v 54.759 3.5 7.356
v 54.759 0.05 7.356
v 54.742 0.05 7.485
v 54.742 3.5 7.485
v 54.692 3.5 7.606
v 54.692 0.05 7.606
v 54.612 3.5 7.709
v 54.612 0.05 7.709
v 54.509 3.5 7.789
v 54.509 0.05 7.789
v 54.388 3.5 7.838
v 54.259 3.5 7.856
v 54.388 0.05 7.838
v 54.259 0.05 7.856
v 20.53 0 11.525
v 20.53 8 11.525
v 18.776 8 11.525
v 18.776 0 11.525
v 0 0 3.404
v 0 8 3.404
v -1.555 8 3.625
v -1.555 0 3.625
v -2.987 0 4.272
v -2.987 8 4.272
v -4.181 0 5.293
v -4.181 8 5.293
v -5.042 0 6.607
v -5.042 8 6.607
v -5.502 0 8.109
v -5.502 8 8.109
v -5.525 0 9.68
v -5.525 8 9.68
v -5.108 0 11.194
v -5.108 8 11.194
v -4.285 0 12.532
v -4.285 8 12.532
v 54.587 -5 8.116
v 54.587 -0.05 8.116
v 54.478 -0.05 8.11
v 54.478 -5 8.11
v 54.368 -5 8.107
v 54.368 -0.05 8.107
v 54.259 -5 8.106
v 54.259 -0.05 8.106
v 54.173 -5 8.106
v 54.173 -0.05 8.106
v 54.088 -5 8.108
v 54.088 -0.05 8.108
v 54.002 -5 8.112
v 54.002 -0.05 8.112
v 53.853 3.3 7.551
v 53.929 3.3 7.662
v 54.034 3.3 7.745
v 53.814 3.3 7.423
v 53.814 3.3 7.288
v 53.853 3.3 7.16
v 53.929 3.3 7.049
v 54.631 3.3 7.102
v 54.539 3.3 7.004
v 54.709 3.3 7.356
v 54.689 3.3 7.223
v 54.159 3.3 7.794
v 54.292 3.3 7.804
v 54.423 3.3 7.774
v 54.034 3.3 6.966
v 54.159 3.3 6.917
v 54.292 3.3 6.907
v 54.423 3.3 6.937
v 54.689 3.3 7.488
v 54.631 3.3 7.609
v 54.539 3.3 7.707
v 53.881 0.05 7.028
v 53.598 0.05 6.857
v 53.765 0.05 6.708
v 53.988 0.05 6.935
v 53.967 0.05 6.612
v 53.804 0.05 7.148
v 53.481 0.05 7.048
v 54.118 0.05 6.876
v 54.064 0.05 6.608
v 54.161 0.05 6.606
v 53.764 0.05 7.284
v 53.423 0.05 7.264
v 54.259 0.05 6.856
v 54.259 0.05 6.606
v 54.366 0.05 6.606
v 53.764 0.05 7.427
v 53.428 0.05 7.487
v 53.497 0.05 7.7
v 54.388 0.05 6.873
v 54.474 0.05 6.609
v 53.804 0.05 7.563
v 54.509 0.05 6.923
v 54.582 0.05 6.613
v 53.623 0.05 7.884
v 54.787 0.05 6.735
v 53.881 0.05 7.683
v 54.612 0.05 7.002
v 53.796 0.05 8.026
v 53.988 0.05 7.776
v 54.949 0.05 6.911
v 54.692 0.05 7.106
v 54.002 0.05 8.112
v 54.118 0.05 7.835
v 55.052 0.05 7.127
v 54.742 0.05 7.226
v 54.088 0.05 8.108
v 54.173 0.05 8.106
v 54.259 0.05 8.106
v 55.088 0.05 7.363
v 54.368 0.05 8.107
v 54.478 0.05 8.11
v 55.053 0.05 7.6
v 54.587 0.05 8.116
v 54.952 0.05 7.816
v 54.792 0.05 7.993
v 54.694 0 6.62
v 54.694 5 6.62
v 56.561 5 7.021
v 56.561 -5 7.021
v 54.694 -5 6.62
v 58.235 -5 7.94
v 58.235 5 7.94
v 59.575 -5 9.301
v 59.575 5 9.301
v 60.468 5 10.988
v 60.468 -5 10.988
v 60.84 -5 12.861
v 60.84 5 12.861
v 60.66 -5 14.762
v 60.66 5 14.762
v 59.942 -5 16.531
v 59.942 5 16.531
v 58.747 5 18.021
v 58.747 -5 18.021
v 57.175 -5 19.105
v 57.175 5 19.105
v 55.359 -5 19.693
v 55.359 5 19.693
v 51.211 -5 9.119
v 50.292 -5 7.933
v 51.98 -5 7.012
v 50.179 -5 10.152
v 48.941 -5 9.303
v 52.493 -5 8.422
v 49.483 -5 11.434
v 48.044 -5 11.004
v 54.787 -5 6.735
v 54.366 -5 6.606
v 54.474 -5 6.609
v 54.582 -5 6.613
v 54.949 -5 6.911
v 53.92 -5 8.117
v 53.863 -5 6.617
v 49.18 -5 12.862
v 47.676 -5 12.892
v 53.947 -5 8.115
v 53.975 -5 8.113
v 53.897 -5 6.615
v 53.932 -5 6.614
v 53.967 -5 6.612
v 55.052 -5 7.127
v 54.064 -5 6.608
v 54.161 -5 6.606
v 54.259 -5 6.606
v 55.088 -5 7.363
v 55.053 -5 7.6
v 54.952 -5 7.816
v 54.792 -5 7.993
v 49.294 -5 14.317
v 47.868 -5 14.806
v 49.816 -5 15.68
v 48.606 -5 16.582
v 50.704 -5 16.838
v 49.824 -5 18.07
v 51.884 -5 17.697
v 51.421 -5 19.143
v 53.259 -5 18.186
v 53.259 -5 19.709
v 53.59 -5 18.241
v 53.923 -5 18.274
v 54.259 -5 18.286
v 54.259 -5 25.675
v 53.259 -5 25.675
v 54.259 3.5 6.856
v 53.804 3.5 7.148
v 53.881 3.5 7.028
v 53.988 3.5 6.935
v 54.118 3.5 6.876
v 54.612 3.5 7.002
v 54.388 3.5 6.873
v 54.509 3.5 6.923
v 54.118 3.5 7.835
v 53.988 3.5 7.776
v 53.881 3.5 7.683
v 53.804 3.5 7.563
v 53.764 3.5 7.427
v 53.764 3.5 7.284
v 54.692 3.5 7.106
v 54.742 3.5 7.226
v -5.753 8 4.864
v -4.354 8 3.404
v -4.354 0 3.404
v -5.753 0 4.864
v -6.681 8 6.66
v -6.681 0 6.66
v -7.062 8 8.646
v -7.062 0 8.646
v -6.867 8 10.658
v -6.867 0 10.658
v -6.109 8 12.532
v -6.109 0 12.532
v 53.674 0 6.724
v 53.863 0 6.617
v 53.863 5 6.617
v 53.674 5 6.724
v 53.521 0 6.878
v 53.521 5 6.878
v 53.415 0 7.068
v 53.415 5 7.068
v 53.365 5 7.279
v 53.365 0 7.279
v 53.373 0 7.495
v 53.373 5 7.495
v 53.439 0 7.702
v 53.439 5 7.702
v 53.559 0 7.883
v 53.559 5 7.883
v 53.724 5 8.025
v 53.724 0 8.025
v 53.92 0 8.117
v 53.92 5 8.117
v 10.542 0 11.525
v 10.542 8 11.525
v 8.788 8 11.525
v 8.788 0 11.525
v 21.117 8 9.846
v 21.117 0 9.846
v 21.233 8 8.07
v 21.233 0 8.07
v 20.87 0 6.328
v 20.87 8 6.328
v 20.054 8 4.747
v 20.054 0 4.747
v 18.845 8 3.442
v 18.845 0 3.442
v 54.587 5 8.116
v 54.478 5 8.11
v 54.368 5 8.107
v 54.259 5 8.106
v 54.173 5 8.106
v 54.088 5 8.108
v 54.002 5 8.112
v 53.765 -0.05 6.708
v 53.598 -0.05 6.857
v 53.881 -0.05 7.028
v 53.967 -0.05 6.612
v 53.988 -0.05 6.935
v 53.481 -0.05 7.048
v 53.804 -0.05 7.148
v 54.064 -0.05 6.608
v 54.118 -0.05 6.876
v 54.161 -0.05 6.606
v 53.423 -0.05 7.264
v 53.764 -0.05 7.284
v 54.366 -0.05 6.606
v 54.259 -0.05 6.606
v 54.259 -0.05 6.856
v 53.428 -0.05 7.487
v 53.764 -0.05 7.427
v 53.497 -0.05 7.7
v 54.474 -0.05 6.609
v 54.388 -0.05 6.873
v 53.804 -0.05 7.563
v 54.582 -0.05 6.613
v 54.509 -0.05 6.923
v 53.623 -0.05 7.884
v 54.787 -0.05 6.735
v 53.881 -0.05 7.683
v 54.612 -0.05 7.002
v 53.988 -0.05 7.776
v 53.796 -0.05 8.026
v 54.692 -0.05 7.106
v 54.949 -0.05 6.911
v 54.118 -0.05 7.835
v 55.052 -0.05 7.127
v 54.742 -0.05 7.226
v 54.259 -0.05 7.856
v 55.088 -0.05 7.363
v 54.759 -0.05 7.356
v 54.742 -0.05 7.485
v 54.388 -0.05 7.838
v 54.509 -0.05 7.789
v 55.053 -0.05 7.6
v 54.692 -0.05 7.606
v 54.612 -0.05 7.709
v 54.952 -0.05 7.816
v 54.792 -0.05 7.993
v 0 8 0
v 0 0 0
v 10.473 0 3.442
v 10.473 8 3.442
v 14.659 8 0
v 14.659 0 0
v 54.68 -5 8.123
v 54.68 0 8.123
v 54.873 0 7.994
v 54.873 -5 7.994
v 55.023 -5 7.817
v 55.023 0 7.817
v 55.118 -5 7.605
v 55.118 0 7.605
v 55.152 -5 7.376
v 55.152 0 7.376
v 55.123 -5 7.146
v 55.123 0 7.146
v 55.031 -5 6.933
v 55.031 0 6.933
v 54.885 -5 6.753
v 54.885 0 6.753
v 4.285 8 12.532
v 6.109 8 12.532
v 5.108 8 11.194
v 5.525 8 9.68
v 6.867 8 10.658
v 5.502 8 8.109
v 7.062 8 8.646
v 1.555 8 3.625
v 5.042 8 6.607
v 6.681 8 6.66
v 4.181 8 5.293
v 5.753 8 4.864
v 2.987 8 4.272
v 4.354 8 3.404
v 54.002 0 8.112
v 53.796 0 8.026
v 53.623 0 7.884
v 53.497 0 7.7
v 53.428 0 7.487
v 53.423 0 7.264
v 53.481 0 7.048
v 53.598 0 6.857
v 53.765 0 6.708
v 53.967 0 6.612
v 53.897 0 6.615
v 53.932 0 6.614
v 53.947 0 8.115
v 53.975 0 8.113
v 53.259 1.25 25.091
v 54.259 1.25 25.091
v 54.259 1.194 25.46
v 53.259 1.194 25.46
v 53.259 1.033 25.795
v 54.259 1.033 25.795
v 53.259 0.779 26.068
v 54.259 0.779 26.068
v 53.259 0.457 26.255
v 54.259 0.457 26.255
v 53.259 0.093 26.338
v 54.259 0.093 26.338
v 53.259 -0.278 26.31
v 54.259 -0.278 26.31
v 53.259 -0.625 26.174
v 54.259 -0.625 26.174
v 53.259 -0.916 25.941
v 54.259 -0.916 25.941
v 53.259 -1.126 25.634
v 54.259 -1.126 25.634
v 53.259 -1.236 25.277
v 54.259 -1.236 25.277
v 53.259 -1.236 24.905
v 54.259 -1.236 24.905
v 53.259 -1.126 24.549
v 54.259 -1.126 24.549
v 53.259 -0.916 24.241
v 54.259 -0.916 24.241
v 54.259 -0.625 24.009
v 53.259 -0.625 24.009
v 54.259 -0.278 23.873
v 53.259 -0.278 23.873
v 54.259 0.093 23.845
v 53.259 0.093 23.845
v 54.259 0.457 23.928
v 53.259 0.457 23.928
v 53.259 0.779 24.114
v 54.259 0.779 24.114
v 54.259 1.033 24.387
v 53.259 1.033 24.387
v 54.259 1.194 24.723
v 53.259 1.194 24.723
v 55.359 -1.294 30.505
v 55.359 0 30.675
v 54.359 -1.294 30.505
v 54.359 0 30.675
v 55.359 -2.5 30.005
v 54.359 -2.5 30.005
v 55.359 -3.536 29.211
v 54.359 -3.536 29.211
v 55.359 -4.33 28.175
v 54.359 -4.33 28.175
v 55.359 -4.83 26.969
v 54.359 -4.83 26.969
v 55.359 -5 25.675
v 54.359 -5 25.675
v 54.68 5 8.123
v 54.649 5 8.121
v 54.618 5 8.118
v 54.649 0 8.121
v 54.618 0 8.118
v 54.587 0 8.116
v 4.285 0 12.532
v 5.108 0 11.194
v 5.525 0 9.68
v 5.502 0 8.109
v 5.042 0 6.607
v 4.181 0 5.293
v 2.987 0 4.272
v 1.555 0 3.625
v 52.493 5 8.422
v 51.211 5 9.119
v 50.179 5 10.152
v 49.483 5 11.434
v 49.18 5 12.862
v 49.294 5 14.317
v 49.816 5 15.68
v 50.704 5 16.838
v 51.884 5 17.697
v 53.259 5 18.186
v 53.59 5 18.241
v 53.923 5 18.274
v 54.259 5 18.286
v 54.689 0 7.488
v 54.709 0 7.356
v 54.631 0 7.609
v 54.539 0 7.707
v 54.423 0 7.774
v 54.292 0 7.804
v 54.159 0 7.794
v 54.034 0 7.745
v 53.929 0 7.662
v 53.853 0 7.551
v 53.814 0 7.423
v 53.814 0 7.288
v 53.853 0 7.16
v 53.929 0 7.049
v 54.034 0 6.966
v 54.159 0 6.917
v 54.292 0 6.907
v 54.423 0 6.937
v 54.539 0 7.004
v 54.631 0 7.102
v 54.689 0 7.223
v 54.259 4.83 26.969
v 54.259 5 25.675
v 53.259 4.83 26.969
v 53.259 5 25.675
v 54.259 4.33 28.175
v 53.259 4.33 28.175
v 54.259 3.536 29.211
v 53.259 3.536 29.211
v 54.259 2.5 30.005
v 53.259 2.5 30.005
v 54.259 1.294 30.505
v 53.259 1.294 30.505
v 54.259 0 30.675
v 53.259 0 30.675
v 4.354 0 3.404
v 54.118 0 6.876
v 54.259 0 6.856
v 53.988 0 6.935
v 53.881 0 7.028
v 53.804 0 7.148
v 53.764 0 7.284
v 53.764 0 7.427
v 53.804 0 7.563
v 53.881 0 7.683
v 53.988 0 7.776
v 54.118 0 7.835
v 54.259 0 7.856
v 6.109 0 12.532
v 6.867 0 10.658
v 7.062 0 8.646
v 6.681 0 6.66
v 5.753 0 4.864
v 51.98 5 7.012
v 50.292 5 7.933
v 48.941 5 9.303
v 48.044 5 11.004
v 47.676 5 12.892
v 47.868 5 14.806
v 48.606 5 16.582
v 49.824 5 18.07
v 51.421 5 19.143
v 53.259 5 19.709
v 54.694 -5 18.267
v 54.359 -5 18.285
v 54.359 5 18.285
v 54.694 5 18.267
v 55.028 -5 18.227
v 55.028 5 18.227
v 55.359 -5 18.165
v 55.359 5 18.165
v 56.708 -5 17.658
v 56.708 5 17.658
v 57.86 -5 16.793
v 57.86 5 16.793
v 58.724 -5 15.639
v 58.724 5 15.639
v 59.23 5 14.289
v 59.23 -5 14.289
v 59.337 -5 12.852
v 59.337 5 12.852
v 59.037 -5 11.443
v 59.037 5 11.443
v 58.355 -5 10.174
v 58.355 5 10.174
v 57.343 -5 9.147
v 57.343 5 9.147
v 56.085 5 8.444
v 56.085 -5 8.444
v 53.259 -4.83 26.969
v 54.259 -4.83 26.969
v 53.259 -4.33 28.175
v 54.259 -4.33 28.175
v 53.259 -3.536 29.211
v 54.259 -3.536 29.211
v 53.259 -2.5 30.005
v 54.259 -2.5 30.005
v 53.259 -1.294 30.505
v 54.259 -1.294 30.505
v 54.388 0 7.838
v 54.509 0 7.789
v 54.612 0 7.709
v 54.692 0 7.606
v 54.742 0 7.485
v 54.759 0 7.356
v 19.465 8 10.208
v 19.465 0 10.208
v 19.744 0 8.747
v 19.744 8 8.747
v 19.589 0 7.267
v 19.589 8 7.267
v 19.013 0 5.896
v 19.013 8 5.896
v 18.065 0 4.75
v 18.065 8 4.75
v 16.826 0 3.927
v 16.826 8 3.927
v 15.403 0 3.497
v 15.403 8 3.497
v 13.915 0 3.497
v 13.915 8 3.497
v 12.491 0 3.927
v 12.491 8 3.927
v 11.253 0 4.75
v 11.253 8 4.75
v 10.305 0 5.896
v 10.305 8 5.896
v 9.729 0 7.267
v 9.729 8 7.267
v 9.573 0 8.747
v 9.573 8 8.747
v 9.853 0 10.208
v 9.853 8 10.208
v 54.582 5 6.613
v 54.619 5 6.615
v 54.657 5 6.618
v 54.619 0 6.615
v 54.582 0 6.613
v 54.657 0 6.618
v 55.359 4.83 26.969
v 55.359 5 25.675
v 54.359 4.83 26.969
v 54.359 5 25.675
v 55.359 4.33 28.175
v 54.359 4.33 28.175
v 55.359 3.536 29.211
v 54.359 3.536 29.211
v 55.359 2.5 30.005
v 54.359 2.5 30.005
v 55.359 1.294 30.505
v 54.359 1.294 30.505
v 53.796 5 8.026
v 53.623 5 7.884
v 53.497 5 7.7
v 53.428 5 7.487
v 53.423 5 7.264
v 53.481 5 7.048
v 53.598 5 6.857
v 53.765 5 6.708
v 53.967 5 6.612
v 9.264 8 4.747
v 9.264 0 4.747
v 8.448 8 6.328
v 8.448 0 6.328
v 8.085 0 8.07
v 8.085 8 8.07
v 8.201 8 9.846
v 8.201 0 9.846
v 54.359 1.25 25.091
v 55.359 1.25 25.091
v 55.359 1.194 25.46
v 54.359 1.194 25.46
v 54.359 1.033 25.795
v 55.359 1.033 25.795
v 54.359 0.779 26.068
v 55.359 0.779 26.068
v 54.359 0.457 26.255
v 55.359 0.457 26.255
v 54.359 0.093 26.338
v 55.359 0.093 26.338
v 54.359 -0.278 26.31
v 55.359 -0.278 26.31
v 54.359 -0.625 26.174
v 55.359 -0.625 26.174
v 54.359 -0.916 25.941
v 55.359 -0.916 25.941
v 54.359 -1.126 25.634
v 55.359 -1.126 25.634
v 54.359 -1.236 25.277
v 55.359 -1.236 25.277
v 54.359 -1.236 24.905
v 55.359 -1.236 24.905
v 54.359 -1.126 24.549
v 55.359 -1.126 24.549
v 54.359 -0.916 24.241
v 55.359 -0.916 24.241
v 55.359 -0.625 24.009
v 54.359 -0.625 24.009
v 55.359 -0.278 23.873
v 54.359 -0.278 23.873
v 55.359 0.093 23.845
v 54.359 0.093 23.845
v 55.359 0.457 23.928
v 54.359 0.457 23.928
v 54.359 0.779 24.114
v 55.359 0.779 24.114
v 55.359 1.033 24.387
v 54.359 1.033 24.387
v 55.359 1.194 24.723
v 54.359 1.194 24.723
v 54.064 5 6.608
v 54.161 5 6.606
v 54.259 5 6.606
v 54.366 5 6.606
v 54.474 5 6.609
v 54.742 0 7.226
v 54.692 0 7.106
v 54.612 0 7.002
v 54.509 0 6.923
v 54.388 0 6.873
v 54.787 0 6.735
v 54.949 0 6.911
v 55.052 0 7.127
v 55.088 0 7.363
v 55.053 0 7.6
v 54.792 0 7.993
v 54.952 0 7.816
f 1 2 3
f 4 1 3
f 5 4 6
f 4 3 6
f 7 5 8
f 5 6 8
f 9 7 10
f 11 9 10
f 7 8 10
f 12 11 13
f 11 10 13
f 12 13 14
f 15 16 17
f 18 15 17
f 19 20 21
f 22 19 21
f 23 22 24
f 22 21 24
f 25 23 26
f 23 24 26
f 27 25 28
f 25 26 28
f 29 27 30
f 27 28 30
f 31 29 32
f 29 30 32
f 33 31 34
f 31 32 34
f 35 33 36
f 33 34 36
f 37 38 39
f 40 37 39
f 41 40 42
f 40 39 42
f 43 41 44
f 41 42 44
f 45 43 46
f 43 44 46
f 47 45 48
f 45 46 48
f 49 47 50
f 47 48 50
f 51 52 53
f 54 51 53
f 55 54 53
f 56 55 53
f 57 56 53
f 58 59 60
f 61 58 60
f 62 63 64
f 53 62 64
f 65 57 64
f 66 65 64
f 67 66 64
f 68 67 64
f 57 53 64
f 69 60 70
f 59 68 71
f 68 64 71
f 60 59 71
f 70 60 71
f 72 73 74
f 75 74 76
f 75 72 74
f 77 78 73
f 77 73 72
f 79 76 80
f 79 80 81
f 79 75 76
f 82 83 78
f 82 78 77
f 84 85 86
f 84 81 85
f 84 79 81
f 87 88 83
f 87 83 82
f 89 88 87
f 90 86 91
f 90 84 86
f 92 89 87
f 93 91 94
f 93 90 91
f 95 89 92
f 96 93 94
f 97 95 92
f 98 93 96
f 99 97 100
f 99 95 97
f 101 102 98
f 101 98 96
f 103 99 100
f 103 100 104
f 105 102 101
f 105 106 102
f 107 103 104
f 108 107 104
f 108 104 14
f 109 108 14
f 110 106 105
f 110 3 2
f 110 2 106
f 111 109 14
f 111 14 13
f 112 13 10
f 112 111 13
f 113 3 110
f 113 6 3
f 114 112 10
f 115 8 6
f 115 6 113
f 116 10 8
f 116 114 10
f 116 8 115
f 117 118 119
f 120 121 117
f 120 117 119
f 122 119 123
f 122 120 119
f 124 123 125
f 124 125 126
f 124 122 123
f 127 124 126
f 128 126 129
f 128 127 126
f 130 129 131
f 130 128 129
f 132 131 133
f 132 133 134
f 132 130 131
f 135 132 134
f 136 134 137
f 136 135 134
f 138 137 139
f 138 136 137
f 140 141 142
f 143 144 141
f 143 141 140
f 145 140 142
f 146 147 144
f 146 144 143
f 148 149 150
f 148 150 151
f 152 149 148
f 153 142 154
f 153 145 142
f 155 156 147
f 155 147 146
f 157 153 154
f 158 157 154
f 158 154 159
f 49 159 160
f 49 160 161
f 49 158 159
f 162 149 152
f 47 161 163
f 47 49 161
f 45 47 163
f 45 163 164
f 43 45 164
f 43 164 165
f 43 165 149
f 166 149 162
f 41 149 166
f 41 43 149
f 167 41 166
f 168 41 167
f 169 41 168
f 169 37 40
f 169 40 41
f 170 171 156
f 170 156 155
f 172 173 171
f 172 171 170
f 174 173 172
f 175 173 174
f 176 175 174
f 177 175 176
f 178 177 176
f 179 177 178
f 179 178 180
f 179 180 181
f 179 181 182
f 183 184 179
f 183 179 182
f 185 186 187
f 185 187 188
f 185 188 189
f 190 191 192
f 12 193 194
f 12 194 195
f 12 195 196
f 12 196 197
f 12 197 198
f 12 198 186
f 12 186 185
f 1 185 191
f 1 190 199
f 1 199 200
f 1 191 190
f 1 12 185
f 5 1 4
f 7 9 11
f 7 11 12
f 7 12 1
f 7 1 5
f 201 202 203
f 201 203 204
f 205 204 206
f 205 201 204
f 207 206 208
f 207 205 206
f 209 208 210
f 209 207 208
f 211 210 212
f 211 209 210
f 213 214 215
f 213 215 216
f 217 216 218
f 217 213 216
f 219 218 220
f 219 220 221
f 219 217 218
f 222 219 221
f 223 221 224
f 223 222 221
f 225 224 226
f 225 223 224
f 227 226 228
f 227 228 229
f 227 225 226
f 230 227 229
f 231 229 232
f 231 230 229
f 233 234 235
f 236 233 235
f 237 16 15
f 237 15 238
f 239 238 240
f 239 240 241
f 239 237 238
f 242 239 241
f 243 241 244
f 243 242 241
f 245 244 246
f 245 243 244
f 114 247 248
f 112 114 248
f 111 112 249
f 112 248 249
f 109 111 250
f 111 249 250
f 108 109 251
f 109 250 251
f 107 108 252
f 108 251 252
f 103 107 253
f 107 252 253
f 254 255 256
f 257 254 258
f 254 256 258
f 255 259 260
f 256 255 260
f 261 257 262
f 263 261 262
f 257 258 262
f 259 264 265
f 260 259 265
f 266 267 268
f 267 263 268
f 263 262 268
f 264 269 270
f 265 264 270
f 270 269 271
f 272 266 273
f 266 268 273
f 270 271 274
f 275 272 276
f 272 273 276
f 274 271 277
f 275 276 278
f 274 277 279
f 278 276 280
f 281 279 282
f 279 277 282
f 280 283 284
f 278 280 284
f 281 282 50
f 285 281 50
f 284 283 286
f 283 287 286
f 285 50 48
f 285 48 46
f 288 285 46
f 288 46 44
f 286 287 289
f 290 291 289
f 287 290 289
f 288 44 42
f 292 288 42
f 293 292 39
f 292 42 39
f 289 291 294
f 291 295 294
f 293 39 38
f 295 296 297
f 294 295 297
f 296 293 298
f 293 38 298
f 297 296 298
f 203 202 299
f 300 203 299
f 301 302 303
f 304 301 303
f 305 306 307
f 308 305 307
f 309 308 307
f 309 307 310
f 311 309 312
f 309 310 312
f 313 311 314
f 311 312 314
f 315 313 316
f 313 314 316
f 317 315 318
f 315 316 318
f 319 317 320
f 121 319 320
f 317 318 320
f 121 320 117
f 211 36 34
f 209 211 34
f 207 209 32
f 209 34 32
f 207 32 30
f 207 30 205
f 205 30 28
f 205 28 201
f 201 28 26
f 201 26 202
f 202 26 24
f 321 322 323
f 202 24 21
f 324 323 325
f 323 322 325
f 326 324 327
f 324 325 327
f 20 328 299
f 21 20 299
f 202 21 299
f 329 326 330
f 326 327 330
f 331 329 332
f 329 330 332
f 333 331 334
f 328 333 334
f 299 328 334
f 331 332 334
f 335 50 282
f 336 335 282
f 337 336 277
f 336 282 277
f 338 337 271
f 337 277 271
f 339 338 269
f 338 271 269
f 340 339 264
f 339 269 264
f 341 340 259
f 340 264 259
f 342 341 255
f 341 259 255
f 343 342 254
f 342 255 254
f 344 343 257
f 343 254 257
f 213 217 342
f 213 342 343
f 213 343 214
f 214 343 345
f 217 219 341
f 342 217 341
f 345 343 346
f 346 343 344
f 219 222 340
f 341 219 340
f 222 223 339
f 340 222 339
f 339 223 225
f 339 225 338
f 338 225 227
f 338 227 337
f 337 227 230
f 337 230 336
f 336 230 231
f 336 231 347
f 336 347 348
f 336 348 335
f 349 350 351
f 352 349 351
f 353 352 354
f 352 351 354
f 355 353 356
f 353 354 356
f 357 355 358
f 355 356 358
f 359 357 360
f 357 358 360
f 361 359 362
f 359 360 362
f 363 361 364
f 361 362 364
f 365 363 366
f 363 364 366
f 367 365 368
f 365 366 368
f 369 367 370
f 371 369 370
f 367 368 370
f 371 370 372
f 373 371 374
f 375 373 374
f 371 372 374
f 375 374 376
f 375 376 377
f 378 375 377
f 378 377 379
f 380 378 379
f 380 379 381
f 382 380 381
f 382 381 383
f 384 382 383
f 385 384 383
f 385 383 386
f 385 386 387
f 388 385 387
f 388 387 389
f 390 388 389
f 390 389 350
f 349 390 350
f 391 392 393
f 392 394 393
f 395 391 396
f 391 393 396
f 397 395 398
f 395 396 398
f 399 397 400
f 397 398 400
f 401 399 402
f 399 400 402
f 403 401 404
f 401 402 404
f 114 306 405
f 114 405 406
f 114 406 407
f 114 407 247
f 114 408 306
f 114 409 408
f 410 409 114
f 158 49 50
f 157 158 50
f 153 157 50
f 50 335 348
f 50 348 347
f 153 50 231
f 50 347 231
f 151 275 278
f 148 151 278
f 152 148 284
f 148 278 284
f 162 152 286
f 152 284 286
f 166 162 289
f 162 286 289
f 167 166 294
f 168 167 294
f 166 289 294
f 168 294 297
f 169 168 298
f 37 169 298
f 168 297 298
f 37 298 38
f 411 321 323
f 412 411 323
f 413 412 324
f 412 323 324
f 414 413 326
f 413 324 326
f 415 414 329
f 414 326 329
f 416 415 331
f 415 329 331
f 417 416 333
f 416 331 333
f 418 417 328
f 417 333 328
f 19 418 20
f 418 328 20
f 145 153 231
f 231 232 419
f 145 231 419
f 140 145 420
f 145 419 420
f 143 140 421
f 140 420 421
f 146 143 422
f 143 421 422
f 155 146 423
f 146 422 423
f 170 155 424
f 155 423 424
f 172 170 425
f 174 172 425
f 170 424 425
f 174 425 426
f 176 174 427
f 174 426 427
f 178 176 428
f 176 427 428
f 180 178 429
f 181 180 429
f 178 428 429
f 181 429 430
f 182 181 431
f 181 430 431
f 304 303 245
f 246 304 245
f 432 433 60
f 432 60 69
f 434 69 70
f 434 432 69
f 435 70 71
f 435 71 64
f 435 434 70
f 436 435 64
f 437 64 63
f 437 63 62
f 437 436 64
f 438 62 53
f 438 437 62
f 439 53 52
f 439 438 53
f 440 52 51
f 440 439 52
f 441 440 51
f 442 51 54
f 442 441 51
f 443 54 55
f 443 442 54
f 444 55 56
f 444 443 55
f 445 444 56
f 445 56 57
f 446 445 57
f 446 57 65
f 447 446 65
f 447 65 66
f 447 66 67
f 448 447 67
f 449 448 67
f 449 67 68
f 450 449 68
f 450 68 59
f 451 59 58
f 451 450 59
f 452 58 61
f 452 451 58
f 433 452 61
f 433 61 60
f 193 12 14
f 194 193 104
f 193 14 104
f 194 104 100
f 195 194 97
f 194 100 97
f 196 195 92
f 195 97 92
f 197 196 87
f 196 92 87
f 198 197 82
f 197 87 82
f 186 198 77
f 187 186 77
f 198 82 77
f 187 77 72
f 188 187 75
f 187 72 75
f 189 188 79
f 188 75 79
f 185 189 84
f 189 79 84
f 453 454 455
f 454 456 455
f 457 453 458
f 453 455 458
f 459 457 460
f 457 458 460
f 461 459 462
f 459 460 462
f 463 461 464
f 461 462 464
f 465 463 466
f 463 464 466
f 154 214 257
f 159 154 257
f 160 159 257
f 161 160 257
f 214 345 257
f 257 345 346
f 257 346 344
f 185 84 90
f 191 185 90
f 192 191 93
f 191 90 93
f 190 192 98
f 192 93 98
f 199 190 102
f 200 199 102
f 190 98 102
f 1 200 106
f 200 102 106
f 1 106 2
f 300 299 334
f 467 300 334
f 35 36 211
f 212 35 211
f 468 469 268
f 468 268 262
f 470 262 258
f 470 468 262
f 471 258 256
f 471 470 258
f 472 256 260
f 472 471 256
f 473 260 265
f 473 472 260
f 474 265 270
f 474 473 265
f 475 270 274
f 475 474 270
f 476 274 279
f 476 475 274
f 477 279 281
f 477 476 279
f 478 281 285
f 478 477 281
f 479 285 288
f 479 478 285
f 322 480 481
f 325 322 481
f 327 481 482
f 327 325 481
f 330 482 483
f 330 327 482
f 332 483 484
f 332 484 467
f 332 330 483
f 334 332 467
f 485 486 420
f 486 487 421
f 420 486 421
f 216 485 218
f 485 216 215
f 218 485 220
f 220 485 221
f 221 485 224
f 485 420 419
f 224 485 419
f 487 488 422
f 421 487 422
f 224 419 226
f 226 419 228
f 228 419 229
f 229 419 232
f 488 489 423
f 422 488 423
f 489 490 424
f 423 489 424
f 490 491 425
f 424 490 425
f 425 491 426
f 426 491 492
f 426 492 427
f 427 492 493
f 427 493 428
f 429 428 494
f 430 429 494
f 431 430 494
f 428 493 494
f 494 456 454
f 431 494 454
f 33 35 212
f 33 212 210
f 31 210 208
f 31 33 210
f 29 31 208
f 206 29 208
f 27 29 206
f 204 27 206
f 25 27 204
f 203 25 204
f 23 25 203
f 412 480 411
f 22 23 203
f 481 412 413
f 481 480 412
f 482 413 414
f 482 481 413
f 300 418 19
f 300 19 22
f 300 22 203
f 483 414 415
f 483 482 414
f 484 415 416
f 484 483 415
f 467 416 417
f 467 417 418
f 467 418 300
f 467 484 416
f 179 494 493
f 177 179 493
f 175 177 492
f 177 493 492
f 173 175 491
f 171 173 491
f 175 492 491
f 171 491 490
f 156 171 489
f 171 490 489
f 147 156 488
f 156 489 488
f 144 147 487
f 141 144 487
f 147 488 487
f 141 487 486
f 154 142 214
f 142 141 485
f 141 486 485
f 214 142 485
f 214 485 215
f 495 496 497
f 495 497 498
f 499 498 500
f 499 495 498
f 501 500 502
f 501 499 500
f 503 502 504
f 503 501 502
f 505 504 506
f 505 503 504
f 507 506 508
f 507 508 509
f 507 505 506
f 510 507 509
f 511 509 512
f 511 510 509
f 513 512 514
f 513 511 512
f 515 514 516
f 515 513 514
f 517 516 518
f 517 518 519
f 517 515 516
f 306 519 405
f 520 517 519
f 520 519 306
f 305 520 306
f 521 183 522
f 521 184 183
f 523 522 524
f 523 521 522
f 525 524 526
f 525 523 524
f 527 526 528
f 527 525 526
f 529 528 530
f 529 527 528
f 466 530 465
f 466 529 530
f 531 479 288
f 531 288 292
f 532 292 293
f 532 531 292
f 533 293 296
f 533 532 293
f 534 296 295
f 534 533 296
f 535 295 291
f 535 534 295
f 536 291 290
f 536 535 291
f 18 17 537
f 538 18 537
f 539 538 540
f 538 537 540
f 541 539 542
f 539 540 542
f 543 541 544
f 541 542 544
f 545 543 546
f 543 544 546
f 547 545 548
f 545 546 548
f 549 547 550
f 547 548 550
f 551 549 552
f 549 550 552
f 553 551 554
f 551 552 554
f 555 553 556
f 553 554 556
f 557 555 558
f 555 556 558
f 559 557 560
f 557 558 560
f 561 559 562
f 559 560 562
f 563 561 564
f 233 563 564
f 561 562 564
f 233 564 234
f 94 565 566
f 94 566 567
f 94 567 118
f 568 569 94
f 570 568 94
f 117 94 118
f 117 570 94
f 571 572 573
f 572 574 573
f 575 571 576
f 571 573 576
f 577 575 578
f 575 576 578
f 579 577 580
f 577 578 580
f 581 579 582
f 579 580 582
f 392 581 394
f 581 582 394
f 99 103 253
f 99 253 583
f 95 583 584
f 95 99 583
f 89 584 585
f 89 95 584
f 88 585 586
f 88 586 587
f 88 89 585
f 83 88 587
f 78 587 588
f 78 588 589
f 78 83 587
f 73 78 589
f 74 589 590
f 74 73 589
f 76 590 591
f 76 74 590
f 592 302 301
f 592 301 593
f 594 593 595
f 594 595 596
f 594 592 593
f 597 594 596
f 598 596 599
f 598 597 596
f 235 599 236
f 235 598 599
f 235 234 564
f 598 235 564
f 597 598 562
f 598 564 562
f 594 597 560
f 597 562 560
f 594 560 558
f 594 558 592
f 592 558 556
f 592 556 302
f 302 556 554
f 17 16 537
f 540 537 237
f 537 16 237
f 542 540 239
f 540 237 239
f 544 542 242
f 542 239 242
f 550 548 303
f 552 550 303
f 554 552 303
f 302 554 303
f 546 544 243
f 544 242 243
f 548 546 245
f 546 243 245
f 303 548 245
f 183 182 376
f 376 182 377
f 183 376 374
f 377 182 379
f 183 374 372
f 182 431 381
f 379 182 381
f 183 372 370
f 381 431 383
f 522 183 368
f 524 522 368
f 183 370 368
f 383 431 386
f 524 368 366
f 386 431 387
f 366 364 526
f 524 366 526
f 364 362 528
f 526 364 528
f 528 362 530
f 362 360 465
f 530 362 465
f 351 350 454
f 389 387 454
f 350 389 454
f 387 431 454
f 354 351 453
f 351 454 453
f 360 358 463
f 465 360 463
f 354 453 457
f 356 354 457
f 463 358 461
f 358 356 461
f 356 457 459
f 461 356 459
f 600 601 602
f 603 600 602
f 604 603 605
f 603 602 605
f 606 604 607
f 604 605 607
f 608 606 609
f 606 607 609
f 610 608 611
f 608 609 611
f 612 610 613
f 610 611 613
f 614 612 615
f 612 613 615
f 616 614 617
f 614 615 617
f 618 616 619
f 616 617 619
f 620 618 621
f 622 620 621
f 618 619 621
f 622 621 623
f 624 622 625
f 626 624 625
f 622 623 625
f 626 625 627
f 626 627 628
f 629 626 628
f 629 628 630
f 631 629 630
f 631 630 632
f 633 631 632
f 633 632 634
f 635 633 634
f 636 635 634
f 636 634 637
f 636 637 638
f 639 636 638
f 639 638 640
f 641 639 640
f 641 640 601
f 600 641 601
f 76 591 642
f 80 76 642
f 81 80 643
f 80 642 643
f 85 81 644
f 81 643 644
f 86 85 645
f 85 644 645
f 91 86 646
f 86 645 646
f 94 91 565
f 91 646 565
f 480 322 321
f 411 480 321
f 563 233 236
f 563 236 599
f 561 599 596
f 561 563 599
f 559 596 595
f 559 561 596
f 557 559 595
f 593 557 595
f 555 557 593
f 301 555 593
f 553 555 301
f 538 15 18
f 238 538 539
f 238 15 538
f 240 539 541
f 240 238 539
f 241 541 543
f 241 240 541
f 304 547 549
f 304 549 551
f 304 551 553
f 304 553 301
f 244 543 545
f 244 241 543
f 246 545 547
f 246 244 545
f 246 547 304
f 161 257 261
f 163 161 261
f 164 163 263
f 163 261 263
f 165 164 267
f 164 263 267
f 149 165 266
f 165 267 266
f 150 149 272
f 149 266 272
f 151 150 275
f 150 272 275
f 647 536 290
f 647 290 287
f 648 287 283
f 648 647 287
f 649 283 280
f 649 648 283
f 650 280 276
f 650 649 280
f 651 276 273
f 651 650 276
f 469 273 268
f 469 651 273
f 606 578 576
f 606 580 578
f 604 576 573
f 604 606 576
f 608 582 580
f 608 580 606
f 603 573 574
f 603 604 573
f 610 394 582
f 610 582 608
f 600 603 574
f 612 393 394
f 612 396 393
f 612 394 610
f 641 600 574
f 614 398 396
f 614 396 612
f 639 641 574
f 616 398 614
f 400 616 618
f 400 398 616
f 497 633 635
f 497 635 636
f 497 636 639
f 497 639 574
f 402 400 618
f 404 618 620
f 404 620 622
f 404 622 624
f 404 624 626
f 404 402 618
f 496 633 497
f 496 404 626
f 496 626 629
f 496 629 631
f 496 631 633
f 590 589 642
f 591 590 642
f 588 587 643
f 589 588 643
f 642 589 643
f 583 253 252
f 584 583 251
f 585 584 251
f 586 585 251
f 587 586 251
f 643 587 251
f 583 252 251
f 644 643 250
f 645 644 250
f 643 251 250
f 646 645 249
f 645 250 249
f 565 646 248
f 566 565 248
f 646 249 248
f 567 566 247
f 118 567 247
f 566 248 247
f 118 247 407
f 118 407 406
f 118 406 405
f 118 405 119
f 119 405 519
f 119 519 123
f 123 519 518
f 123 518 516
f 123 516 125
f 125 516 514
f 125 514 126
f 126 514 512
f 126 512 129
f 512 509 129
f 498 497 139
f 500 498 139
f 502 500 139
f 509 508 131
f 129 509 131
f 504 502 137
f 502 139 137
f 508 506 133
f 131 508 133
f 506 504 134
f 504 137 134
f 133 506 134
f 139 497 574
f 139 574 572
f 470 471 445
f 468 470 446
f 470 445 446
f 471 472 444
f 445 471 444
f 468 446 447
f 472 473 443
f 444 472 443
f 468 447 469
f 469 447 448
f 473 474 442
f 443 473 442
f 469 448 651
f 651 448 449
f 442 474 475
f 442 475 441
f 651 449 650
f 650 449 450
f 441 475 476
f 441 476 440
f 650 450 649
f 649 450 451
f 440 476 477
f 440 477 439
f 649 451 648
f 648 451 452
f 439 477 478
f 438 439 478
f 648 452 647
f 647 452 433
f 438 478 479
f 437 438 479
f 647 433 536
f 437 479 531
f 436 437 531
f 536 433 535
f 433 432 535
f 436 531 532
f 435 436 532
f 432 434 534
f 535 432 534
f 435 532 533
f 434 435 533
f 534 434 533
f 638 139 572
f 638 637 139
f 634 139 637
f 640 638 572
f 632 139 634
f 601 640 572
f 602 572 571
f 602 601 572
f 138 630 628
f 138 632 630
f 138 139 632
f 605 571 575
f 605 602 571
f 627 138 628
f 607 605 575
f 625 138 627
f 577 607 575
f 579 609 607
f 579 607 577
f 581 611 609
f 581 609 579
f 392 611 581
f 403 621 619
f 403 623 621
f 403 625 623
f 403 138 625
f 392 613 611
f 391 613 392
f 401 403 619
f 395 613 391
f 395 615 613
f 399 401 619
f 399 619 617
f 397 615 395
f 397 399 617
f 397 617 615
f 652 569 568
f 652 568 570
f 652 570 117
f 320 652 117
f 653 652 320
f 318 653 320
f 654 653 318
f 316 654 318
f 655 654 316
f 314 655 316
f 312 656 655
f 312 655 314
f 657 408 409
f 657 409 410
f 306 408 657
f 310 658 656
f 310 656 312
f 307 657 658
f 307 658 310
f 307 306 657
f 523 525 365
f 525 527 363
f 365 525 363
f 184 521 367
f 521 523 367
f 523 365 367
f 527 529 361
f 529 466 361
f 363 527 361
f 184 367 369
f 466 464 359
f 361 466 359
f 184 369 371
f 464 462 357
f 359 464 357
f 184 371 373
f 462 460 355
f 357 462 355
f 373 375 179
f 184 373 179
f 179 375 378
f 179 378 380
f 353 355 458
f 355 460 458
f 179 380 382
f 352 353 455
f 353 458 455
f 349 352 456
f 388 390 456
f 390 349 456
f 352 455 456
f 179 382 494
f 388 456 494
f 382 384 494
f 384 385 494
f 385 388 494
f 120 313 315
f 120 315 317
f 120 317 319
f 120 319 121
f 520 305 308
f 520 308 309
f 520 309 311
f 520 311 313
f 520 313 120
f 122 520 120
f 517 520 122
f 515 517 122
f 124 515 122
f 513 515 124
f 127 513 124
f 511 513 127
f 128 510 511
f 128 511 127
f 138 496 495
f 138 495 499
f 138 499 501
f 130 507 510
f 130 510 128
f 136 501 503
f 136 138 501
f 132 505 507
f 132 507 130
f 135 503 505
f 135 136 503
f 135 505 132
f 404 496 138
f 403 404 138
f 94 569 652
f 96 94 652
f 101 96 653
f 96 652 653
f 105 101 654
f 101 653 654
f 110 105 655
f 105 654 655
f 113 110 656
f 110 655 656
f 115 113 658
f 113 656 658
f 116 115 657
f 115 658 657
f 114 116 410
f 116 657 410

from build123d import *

# Parameters (mm, degrees)
F5_DEPTH  = 5
F0_R      = 0.45
F6_DEPTH  = 3.5
F7_DEPTH  = 5
F8_DEPTH  = 3.3
F9_DEPTH  = 5.001
F10_DEPTH = 8.001
F11_DEPTH = 0.05
F12_R     = 1.25
F13_DEPTH = 62.4297639076
F14_R     = 4.99999


# Not quite as in the source:
# - a fillet or chamfer is up to 0.001 mm smaller than in the source, because OpenCascade refuses the exact size
# - a feature names something its author has since deleted; it is built from what else it names


with BuildPart() as f3:
    # F3: sweep along a path in F2
    with BuildLine(Plane.XY) as f3_path:
        Line((0, 0), (0, 8))
    # F0 (on Front) → F3 (sweep)
    with BuildSketch(Plane.XZ):
        with BuildLine():
            Line((-4.2852259595, 12.5322833964), (-6.1092684933, 12.5322833964))
            ThreePointArc((-6.1092684933, 12.5322833964), (-6.9428544736, 7.6391569536), (-4.3543082114, 3.4039497307))
            Line((-4.3543082114, 3.4039497307), (0, 3.4039497307))
            ThreePointArc((0, 3.4039497307), (-5.042063988, 6.6069916109), (-4.2852259595, 12.5322833964))
        make_face()
        with BuildLine():
            Line((0, 3.4039497307), (-4.3543082114, 3.4039497307))
            ThreePointArc((-4.3543082114, 3.4039497307), (-2.3027157879, 2.2894602214), (0, 1.9039497307))
            Line((0, 1.9039497307), (0, 3.4039497307))
        make_face()
        with BuildLine():
            ThreePointArc((0, 1.9039497307), (-2.3027157879, 2.2894602214), (-4.3543082114, 3.4039497307))
            Line((-4.3543082114, 3.4039497307), (0, 0))
            Line((0, 0), (0, 1.9039497307))
        make_face()
        with BuildLine():
            ThreePointArc((4.3543082114, 3.4039497307), (2.3027157879, 2.2894602214), (0, 1.9039497307))
            Line((0, 1.9039497307), (0, 0))
            Line((0, 0), (4.3543082114, 3.4039497307))
        make_face()
        with BuildLine():
            Line((0, 3.4039497307), (0, 1.9039497307))
            ThreePointArc((0, 1.9039497307), (2.3027157879, 2.2894602214), (4.3543082114, 3.4039497307))
            Line((4.3543082114, 3.4039497307), (0, 3.4039497307))
        make_face()
        with BuildLine():
            ThreePointArc((4.2852259595, 12.5322833964), (5.042063988, 6.6069916109), (0, 3.4039497307))
            Line((0, 3.4039497307), (4.3543082114, 3.4039497307))
            ThreePointArc((4.3543082114, 3.4039497307), (6.9428544736, 7.6391569536), (6.1092684933, 12.5322833964))
            Line((6.1092684933, 12.5322833964), (4.2852259595, 12.5322833964))
        make_face()
    sweep(path=f3_path.line)

    # F0 (on Front) → F9 (cut, through all)
    with BuildSketch(Plane.XZ):
        with BuildLine():
            ThreePointArc((54.5868154242, 8.1161158316), (55.0876267464, 7.3630999101), (54.581783754, 6.6134547771))
            ThreePointArc((54.581783754, 6.6134547771), (54.6381547588, 6.6164632985), (54.6944979239, 6.6199545901))
            ThreePointArc((54.6944979239, 6.6199545901), (55.1524674782, 7.3759380646), (54.6800855939, 8.1230006335))
            ThreePointArc((54.6800855939, 8.1230006335), (54.6334663221, 8.1193440091), (54.5868154242, 8.1161158316))
        make_face()
    extrude(amount=F9_DEPTH, mode=Mode.SUBTRACT)

    # F0 (on Front) → F10 (cut, through all)
    with BuildSketch(Plane.XZ):
        with BuildLine():
            ThreePointArc((53.9199314878, 8.116823601), (53.3614179699, 7.3872965022), (53.862876759, 6.6174353327))
            ThreePointArc((53.862876759, 6.6174353327), (53.9147482987, 6.6145187306), (53.9666412198, 6.6120111547))
            ThreePointArc((53.9666412198, 6.6120111547), (53.4175421646, 7.3754821716), (54.0022997363, 8.1119985313))
            ThreePointArc((54.0022997363, 8.1119985313), (53.961105835, 8.1142441636), (53.9199314878, 8.116823601))
        make_face()
    extrude(amount=-F10_DEPTH, mode=Mode.SUBTRACT)


with BuildPart() as f4:
    # F4: sweep along a path in F2
    with BuildLine(Plane.XY) as f4_path:
        Line((14.6589075401, 0), (14.6589075401, 8))
    # F0 (on Front) → F4 (sweep)
    with BuildSketch(Plane.XZ):
        with BuildLine():
            Line((10.542163481, 11.5254557146), (8.7879977598, 11.5254557146))
            ThreePointArc((8.7879977598, 11.5254557146), (8.2076139721, 7.1870854906), (10.4732176329, 3.442043222))
            Line((10.4732176329, 3.442043222), (14.6589075401, 3.442043222))
            ThreePointArc((14.6589075401, 3.442043222), (10.1232394754, 6.2221048665), (10.542163481, 11.5254557146))
        make_face()
        with BuildLine():
            Line((14.6589075401, 3.442043222), (10.4732176329, 3.442043222))
            ThreePointArc((10.4732176329, 3.442043222), (12.4357341326, 2.3283668926), (14.6589075401, 1.942043222))
            Line((14.6589075401, 1.942043222), (14.6589075401, 3.442043222))
        make_face()
        with BuildLine():
            ThreePointArc((14.6589075401, 1.942043222), (12.4357341326, 2.3283668926), (10.4732176329, 3.442043222))
            Line((10.4732176329, 3.442043222), (14.6589075401, 0))
            Line((14.6589075401, 0), (14.6589075401, 1.942043222))
        make_face()
        with BuildLine():
            ThreePointArc((18.8445974474, 3.442043222), (16.8820809477, 2.3283668926), (14.6589075401, 1.942043222))
            Line((14.6589075401, 1.942043222), (14.6589075401, 0))
            Line((14.6589075401, 0), (18.8445974474, 3.442043222))
        make_face()
        with BuildLine():
            Line((14.6589075401, 3.442043222), (14.6589075401, 1.942043222))
            ThreePointArc((14.6589075401, 1.942043222), (16.8820809477, 2.3283668926), (18.8445974474, 3.442043222))
            Line((18.8445974474, 3.442043222), (14.6589075401, 3.442043222))
        make_face()
        with BuildLine():
            ThreePointArc((18.7756515993, 11.5254557146), (19.1945756049, 6.2221048665), (14.6589075401, 3.442043222))
            Line((14.6589075401, 3.442043222), (18.8445974474, 3.442043222))
            ThreePointArc((18.8445974474, 3.442043222), (21.1102011082, 7.1870854906), (20.5298173205, 11.5254557146))
            Line((20.5298173205, 11.5254557146), (18.7756515993, 11.5254557146))
        make_face()
    sweep(path=f4_path.line)


with BuildPart() as f5:
    # F0 (on Front) → F5 (new body)
    with BuildSketch(Plane.XZ):
        with BuildLine():
            Line((53.2587639076, 18.1863348766), (53.2587639076, 19.7092189305))
            ThreePointArc((53.2587639076, 19.7092189305), (47.6757687932, 12.8917648009), (53.862876759, 6.6174353327))
            ThreePointArc((53.862876759, 6.6174353327), (53.3614179699, 7.3872965022), (53.9199314878, 8.116823601))
            ThreePointArc((53.9199314878, 8.116823601), (49.1797007662, 12.8620403018), (53.2587639076, 18.1863348766))
        make_face()
        with BuildLine():
            Line((53.2587639076, 30.67503149), (53.2587639076, 19.7092189305))
            Line((53.2587639076, 19.7092189305), (53.2587639076, 18.1863348766))
            ThreePointArc((53.2587639076, 18.1863348766), (53.7563098464, 18.2606730117), (54.2587639076, 18.2855333378))
            Line((54.2587639076, 18.2855333378), (54.2587639076, 30.67503149))
            Line((54.2587639076, 30.67503149), (53.2587639076, 30.67503149))
        make_face()
    extrude(amount=-F5_DEPTH)



with BuildPart() as f5b:
    # F0 (on Front) → F5, piece 2 (new body)
    with BuildSketch(Plane.XZ):
        with BuildLine():
            ThreePointArc((54.0022997363, 8.1119985313), (53.4175421646, 7.3754821716), (53.9666412198, 6.6120111547))
            ThreePointArc((53.9666412198, 6.6120111547), (54.1126666567, 6.6071529911), (54.2587639076, 6.6055333378))
            Line((54.2587639076, 6.6055333378), (54.2587639076, 6.8555333378))
            ThreePointArc((54.2587639076, 6.8555333378), (53.7587639076, 7.3555333378), (54.2587639076, 7.8555333378))
            Line((54.2587639076, 7.8555333378), (54.2587639076, 8.1055333378))
            ThreePointArc((54.2587639076, 8.1055333378), (54.1304910833, 8.1071498929), (54.0022997363, 8.1119985313))
        make_face()
        with BuildLine():
            Line((54.2587639076, 6.8555333378), (54.2587639076, 6.6055333378))
            ThreePointArc((54.2587639076, 6.6055333378), (54.420322388, 6.6075139953), (54.581783754, 6.6134547771))
            ThreePointArc((54.581783754, 6.6134547771), (55.0876267464, 7.3630999101), (54.5868154242, 8.1161158316))
            ThreePointArc((54.5868154242, 8.1161158316), (54.4228749879, 8.1081796492), (54.2587639076, 8.1055333378))
            Line((54.2587639076, 8.1055333378), (54.2587639076, 7.8555333378))
            ThreePointArc((54.2587639076, 7.8555333378), (54.6123172982, 7.7090867284), (54.7587639076, 7.3555333378))
            ThreePointArc((54.7587639076, 7.3555333378), (54.6123172982, 7.0019799472), (54.2587639076, 6.8555333378))
        make_face()
        with BuildLine():
            ThreePointArc((54.5868154242, 8.1161158316), (55.0876267464, 7.3630999101), (54.581783754, 6.6134547771))
            ThreePointArc((54.581783754, 6.6134547771), (54.6381547588, 6.6164632985), (54.6944979239, 6.6199545901))
            ThreePointArc((54.6944979239, 6.6199545901), (55.1524674782, 7.3759380646), (54.6800855939, 8.1230006335))
            ThreePointArc((54.6800855939, 8.1230006335), (54.6334663221, 8.1193440091), (54.5868154242, 8.1161158316))
        make_face()
        with BuildLine():
            ThreePointArc((54.2587639076, 7.8555333378), (53.7587639076, 7.3555333378), (54.2587639076, 6.8555333378))
            ThreePointArc((54.2587639076, 6.8555333378), (54.6123172982, 7.0019799472), (54.7587639076, 7.3555333378))
            ThreePointArc((54.7587639076, 7.3555333378), (54.6123172982, 7.7090867284), (54.2587639076, 7.8555333378))
        make_face()
        with Locations((54.2587639076, 7.3555333378)):
            Circle(F0_R, mode=Mode.SUBTRACT)
        with BuildLine():
            ThreePointArc((54.6800855939, 8.1230006335), (55.1524674782, 7.3759380646), (54.6944979239, 6.6199545901))
            ThreePointArc((54.6944979239, 6.6199545901), (60.8402732623, 12.8611165114), (55.3587639076, 19.6930790283))
            Line((55.3587639076, 19.6930790283), (55.3587639076, 18.1652516397))
            ThreePointArc((55.3587639076, 18.1652516397), (59.3371796287, 12.8523223769), (54.6800855939, 8.1230006335))
        make_face()
        with BuildLine():
            Line((55.3587639076, 18.1652516397), (55.3587639076, 19.6930790283))
            Line((55.3587639076, 19.6930790283), (55.3587639076, 30.67503149))
            Line((55.3587639076, 30.67503149), (54.3587639076, 30.67503149))
            Line((54.3587639076, 30.67503149), (54.3587639076, 18.2845509247))
            ThreePointArc((54.3587639076, 18.2845509247), (54.8617216838, 18.24969419), (55.3587639076, 18.1652516397))
        make_face()
        with Locations((54.2587639076, 7.3555333378)):
            Circle(F0_R)
    extrude(amount=-F5_DEPTH)

    # F0 (on Front) → F6 (cut)
    with BuildSketch(Plane.XZ):
        with BuildLine():
            ThreePointArc((54.2587639076, 7.8555333378), (53.7587639076, 7.3555333378), (54.2587639076, 6.8555333378))
            ThreePointArc((54.2587639076, 6.8555333378), (54.6123172982, 7.0019799472), (54.7587639076, 7.3555333378))
            ThreePointArc((54.7587639076, 7.3555333378), (54.6123172982, 7.7090867284), (54.2587639076, 7.8555333378))
        make_face()
        with Locations((54.2587639076, 7.3555333378)):
            Circle(F0_R, mode=Mode.SUBTRACT)
        with Locations((54.2587639076, 7.3555333378)):
            Circle(F0_R)
    extrude(amount=-F6_DEPTH, mode=Mode.SUBTRACT)


with BuildPart() as f5_1:
    add(f5.part)

    add(f5b.part)  # F7 merges F5b
    # F0 (on Front) → F7 (join)
    with BuildSketch(Plane.XZ):
        with BuildLine():
            Line((53.2587639076, 18.1863348766), (53.2587639076, 19.7092189305))
            ThreePointArc((53.2587639076, 19.7092189305), (47.6757687932, 12.8917648009), (53.862876759, 6.6174353327))
            ThreePointArc((53.862876759, 6.6174353327), (53.3614179699, 7.3872965022), (53.9199314878, 8.116823601))
            ThreePointArc((53.9199314878, 8.116823601), (49.1797007662, 12.8620403018), (53.2587639076, 18.1863348766))
        make_face()
        with BuildLine():
            Line((53.2587639076, 30.67503149), (53.2587639076, 19.7092189305))
            Line((53.2587639076, 19.7092189305), (53.2587639076, 18.1863348766))
            ThreePointArc((53.2587639076, 18.1863348766), (53.7563098464, 18.2606730117), (54.2587639076, 18.2855333378))
            Line((54.2587639076, 18.2855333378), (54.2587639076, 30.67503149))
            Line((54.2587639076, 30.67503149), (53.2587639076, 30.67503149))
        make_face()
        with BuildLine():
            ThreePointArc((53.9199314878, 8.116823601), (53.3614179699, 7.3872965022), (53.862876759, 6.6174353327))
            ThreePointArc((53.862876759, 6.6174353327), (53.9147482987, 6.6145187306), (53.9666412198, 6.6120111547))
            ThreePointArc((53.9666412198, 6.6120111547), (53.4175421646, 7.3754821716), (54.0022997363, 8.1119985313))
            ThreePointArc((54.0022997363, 8.1119985313), (53.961105835, 8.1142441636), (53.9199314878, 8.116823601))
        make_face()
        with BuildLine():
            ThreePointArc((54.0022997363, 8.1119985313), (53.4175421646, 7.3754821716), (53.9666412198, 6.6120111547))
            ThreePointArc((53.9666412198, 6.6120111547), (54.1126666567, 6.6071529911), (54.2587639076, 6.6055333378))
            Line((54.2587639076, 6.6055333378), (54.2587639076, 6.8555333378))
            ThreePointArc((54.2587639076, 6.8555333378), (53.7587639076, 7.3555333378), (54.2587639076, 7.8555333378))
            Line((54.2587639076, 7.8555333378), (54.2587639076, 8.1055333378))
            ThreePointArc((54.2587639076, 8.1055333378), (54.1304910833, 8.1071498929), (54.0022997363, 8.1119985313))
        make_face()
        with BuildLine():
            Line((54.2587639076, 6.8555333378), (54.2587639076, 6.6055333378))
            ThreePointArc((54.2587639076, 6.6055333378), (54.420322388, 6.6075139953), (54.581783754, 6.6134547771))
            ThreePointArc((54.581783754, 6.6134547771), (55.0876267464, 7.3630999101), (54.5868154242, 8.1161158316))
            ThreePointArc((54.5868154242, 8.1161158316), (54.4228749879, 8.1081796492), (54.2587639076, 8.1055333378))
            Line((54.2587639076, 8.1055333378), (54.2587639076, 7.8555333378))
            ThreePointArc((54.2587639076, 7.8555333378), (54.6123172982, 7.7090867284), (54.7587639076, 7.3555333378))
            ThreePointArc((54.7587639076, 7.3555333378), (54.6123172982, 7.0019799472), (54.2587639076, 6.8555333378))
        make_face()
        with BuildLine():
            ThreePointArc((54.2587639076, 7.8555333378), (53.7587639076, 7.3555333378), (54.2587639076, 6.8555333378))
            ThreePointArc((54.2587639076, 6.8555333378), (54.6123172982, 7.0019799472), (54.7587639076, 7.3555333378))
            ThreePointArc((54.7587639076, 7.3555333378), (54.6123172982, 7.7090867284), (54.2587639076, 7.8555333378))
        make_face()
        with Locations((54.2587639076, 7.3555333378)):
            Circle(F0_R, mode=Mode.SUBTRACT)
        with BuildLine():
            ThreePointArc((54.6800855939, 8.1230006335), (55.1524674782, 7.3759380646), (54.6944979239, 6.6199545901))
            ThreePointArc((54.6944979239, 6.6199545901), (60.8402732623, 12.8611165114), (55.3587639076, 19.6930790283))
            Line((55.3587639076, 19.6930790283), (55.3587639076, 18.1652516397))
            ThreePointArc((55.3587639076, 18.1652516397), (59.3371796287, 12.8523223769), (54.6800855939, 8.1230006335))
        make_face()
        with BuildLine():
            Line((55.3587639076, 18.1652516397), (55.3587639076, 19.6930790283))
            Line((55.3587639076, 19.6930790283), (55.3587639076, 30.67503149))
            Line((55.3587639076, 30.67503149), (54.3587639076, 30.67503149))
            Line((54.3587639076, 30.67503149), (54.3587639076, 18.2845509247))
            ThreePointArc((54.3587639076, 18.2845509247), (54.8617216838, 18.24969419), (55.3587639076, 18.1652516397))
        make_face()
        with Locations((54.2587639076, 7.3555333378)):
            Circle(F0_R)
    extrude(amount=F7_DEPTH)

    # F0 (on Front) → F8 (join)
    with BuildSketch(Plane.XZ):
        with Locations((54.2587639076, 7.3555333378)):
            Circle(F0_R)
    extrude(amount=-F8_DEPTH)

    # F0 (on Front) → F11 (cut, symmetric)
    with BuildSketch(Plane.XZ):
        with BuildLine():
            Line((54.2587639076, 6.8555333378), (54.2587639076, 6.6055333378))
            ThreePointArc((54.2587639076, 6.6055333378), (54.420322388, 6.6075139953), (54.581783754, 6.6134547771))
            ThreePointArc((54.581783754, 6.6134547771), (55.0876267464, 7.3630999101), (54.5868154242, 8.1161158316))
            ThreePointArc((54.5868154242, 8.1161158316), (54.4228749879, 8.1081796492), (54.2587639076, 8.1055333378))
            Line((54.2587639076, 8.1055333378), (54.2587639076, 7.8555333378))
            ThreePointArc((54.2587639076, 7.8555333378), (54.6123172982, 7.7090867284), (54.7587639076, 7.3555333378))
            ThreePointArc((54.7587639076, 7.3555333378), (54.6123172982, 7.0019799472), (54.2587639076, 6.8555333378))
        make_face()
        with BuildLine():
            ThreePointArc((54.0022997363, 8.1119985313), (53.4175421646, 7.3754821716), (53.9666412198, 6.6120111547))
            ThreePointArc((53.9666412198, 6.6120111547), (54.1126666567, 6.6071529911), (54.2587639076, 6.6055333378))
            Line((54.2587639076, 6.6055333378), (54.2587639076, 6.8555333378))
            ThreePointArc((54.2587639076, 6.8555333378), (53.7587639076, 7.3555333378), (54.2587639076, 7.8555333378))
            Line((54.2587639076, 7.8555333378), (54.2587639076, 8.1055333378))
            ThreePointArc((54.2587639076, 8.1055333378), (54.1304910833, 8.1071498929), (54.0022997363, 8.1119985313))
        make_face()
    extrude(amount=F11_DEPTH, both=True, mode=Mode.SUBTRACT)

    # F12 (on face) → F13 (cut, through all)
    with BuildSketch(Plane.YZ.offset(55.3587639076)):
        with Locations((0, 25.0911675394)):
            Circle(F12_R)
    extrude(amount=-F13_DEPTH, mode=Mode.SUBTRACT)

    # F14 (radius 5 in the source; OpenCascade refuses exactly that, so slightly less here)
    f14_edges = [f5_1.edges().sort_by_distance(p)[0] for p in [
        (53.758764, -5, 30.675031),
        (54.858764, -5, 30.675031),
        (53.758764, 5, 30.675031),
        (54.858764, 5, 30.675031),
    ]]
    fillet(f14_edges, radius=F14_R)


solid = Compound([f3.part, f4.part, f5_1.part])
